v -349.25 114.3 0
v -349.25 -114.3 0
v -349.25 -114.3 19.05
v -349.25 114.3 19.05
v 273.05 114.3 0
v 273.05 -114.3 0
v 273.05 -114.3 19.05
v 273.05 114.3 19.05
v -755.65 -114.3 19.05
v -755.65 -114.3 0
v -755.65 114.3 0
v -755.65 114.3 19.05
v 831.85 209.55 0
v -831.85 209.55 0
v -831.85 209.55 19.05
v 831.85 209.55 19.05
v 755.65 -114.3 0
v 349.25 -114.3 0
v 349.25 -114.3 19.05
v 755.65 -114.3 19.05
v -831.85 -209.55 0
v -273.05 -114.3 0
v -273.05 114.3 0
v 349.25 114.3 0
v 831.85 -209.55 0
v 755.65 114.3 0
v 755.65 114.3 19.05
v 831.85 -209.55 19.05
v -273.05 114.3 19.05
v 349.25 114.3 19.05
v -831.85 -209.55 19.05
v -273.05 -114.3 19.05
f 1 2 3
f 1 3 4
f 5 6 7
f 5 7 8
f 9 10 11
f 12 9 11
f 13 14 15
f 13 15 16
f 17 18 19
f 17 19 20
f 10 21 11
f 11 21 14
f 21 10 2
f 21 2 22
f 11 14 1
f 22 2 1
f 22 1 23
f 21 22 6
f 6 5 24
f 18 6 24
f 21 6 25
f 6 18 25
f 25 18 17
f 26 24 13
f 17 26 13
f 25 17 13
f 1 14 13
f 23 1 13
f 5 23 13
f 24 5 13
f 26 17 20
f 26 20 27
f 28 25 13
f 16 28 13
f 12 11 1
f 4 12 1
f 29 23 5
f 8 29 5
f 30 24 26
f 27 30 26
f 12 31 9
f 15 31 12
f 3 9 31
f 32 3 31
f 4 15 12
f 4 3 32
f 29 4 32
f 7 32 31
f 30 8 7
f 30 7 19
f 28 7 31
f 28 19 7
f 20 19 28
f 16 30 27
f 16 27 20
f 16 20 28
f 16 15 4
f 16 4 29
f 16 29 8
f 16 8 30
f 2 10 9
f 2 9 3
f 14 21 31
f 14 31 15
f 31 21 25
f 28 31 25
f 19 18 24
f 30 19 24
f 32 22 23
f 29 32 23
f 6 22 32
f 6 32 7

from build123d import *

# Parameters (mm, degrees)
F0_W     = 1663.7
F0_H     = 419.1
F0_W_2   = 406.4
F0_H_2   = 228.6
F0_W_3   = 546.1
F1_DEPTH = 19.05


with BuildPart() as f1:
    # F0 (on Top) → F1 (new body)
    with BuildSketch(Plane.XY):
        Rectangle(F0_W, F0_H)
        with Locations((-552.45, 0)):
            Rectangle(F0_W_2, F0_H_2, mode=Mode.SUBTRACT)
        Rectangle(F0_W_3, F0_H_2, mode=Mode.SUBTRACT)
        with Locations((552.45, 0)):
            Rectangle(F0_W_2, F0_H_2, mode=Mode.SUBTRACT)
    extrude(amount=F1_DEPTH)


solid = f1.part
